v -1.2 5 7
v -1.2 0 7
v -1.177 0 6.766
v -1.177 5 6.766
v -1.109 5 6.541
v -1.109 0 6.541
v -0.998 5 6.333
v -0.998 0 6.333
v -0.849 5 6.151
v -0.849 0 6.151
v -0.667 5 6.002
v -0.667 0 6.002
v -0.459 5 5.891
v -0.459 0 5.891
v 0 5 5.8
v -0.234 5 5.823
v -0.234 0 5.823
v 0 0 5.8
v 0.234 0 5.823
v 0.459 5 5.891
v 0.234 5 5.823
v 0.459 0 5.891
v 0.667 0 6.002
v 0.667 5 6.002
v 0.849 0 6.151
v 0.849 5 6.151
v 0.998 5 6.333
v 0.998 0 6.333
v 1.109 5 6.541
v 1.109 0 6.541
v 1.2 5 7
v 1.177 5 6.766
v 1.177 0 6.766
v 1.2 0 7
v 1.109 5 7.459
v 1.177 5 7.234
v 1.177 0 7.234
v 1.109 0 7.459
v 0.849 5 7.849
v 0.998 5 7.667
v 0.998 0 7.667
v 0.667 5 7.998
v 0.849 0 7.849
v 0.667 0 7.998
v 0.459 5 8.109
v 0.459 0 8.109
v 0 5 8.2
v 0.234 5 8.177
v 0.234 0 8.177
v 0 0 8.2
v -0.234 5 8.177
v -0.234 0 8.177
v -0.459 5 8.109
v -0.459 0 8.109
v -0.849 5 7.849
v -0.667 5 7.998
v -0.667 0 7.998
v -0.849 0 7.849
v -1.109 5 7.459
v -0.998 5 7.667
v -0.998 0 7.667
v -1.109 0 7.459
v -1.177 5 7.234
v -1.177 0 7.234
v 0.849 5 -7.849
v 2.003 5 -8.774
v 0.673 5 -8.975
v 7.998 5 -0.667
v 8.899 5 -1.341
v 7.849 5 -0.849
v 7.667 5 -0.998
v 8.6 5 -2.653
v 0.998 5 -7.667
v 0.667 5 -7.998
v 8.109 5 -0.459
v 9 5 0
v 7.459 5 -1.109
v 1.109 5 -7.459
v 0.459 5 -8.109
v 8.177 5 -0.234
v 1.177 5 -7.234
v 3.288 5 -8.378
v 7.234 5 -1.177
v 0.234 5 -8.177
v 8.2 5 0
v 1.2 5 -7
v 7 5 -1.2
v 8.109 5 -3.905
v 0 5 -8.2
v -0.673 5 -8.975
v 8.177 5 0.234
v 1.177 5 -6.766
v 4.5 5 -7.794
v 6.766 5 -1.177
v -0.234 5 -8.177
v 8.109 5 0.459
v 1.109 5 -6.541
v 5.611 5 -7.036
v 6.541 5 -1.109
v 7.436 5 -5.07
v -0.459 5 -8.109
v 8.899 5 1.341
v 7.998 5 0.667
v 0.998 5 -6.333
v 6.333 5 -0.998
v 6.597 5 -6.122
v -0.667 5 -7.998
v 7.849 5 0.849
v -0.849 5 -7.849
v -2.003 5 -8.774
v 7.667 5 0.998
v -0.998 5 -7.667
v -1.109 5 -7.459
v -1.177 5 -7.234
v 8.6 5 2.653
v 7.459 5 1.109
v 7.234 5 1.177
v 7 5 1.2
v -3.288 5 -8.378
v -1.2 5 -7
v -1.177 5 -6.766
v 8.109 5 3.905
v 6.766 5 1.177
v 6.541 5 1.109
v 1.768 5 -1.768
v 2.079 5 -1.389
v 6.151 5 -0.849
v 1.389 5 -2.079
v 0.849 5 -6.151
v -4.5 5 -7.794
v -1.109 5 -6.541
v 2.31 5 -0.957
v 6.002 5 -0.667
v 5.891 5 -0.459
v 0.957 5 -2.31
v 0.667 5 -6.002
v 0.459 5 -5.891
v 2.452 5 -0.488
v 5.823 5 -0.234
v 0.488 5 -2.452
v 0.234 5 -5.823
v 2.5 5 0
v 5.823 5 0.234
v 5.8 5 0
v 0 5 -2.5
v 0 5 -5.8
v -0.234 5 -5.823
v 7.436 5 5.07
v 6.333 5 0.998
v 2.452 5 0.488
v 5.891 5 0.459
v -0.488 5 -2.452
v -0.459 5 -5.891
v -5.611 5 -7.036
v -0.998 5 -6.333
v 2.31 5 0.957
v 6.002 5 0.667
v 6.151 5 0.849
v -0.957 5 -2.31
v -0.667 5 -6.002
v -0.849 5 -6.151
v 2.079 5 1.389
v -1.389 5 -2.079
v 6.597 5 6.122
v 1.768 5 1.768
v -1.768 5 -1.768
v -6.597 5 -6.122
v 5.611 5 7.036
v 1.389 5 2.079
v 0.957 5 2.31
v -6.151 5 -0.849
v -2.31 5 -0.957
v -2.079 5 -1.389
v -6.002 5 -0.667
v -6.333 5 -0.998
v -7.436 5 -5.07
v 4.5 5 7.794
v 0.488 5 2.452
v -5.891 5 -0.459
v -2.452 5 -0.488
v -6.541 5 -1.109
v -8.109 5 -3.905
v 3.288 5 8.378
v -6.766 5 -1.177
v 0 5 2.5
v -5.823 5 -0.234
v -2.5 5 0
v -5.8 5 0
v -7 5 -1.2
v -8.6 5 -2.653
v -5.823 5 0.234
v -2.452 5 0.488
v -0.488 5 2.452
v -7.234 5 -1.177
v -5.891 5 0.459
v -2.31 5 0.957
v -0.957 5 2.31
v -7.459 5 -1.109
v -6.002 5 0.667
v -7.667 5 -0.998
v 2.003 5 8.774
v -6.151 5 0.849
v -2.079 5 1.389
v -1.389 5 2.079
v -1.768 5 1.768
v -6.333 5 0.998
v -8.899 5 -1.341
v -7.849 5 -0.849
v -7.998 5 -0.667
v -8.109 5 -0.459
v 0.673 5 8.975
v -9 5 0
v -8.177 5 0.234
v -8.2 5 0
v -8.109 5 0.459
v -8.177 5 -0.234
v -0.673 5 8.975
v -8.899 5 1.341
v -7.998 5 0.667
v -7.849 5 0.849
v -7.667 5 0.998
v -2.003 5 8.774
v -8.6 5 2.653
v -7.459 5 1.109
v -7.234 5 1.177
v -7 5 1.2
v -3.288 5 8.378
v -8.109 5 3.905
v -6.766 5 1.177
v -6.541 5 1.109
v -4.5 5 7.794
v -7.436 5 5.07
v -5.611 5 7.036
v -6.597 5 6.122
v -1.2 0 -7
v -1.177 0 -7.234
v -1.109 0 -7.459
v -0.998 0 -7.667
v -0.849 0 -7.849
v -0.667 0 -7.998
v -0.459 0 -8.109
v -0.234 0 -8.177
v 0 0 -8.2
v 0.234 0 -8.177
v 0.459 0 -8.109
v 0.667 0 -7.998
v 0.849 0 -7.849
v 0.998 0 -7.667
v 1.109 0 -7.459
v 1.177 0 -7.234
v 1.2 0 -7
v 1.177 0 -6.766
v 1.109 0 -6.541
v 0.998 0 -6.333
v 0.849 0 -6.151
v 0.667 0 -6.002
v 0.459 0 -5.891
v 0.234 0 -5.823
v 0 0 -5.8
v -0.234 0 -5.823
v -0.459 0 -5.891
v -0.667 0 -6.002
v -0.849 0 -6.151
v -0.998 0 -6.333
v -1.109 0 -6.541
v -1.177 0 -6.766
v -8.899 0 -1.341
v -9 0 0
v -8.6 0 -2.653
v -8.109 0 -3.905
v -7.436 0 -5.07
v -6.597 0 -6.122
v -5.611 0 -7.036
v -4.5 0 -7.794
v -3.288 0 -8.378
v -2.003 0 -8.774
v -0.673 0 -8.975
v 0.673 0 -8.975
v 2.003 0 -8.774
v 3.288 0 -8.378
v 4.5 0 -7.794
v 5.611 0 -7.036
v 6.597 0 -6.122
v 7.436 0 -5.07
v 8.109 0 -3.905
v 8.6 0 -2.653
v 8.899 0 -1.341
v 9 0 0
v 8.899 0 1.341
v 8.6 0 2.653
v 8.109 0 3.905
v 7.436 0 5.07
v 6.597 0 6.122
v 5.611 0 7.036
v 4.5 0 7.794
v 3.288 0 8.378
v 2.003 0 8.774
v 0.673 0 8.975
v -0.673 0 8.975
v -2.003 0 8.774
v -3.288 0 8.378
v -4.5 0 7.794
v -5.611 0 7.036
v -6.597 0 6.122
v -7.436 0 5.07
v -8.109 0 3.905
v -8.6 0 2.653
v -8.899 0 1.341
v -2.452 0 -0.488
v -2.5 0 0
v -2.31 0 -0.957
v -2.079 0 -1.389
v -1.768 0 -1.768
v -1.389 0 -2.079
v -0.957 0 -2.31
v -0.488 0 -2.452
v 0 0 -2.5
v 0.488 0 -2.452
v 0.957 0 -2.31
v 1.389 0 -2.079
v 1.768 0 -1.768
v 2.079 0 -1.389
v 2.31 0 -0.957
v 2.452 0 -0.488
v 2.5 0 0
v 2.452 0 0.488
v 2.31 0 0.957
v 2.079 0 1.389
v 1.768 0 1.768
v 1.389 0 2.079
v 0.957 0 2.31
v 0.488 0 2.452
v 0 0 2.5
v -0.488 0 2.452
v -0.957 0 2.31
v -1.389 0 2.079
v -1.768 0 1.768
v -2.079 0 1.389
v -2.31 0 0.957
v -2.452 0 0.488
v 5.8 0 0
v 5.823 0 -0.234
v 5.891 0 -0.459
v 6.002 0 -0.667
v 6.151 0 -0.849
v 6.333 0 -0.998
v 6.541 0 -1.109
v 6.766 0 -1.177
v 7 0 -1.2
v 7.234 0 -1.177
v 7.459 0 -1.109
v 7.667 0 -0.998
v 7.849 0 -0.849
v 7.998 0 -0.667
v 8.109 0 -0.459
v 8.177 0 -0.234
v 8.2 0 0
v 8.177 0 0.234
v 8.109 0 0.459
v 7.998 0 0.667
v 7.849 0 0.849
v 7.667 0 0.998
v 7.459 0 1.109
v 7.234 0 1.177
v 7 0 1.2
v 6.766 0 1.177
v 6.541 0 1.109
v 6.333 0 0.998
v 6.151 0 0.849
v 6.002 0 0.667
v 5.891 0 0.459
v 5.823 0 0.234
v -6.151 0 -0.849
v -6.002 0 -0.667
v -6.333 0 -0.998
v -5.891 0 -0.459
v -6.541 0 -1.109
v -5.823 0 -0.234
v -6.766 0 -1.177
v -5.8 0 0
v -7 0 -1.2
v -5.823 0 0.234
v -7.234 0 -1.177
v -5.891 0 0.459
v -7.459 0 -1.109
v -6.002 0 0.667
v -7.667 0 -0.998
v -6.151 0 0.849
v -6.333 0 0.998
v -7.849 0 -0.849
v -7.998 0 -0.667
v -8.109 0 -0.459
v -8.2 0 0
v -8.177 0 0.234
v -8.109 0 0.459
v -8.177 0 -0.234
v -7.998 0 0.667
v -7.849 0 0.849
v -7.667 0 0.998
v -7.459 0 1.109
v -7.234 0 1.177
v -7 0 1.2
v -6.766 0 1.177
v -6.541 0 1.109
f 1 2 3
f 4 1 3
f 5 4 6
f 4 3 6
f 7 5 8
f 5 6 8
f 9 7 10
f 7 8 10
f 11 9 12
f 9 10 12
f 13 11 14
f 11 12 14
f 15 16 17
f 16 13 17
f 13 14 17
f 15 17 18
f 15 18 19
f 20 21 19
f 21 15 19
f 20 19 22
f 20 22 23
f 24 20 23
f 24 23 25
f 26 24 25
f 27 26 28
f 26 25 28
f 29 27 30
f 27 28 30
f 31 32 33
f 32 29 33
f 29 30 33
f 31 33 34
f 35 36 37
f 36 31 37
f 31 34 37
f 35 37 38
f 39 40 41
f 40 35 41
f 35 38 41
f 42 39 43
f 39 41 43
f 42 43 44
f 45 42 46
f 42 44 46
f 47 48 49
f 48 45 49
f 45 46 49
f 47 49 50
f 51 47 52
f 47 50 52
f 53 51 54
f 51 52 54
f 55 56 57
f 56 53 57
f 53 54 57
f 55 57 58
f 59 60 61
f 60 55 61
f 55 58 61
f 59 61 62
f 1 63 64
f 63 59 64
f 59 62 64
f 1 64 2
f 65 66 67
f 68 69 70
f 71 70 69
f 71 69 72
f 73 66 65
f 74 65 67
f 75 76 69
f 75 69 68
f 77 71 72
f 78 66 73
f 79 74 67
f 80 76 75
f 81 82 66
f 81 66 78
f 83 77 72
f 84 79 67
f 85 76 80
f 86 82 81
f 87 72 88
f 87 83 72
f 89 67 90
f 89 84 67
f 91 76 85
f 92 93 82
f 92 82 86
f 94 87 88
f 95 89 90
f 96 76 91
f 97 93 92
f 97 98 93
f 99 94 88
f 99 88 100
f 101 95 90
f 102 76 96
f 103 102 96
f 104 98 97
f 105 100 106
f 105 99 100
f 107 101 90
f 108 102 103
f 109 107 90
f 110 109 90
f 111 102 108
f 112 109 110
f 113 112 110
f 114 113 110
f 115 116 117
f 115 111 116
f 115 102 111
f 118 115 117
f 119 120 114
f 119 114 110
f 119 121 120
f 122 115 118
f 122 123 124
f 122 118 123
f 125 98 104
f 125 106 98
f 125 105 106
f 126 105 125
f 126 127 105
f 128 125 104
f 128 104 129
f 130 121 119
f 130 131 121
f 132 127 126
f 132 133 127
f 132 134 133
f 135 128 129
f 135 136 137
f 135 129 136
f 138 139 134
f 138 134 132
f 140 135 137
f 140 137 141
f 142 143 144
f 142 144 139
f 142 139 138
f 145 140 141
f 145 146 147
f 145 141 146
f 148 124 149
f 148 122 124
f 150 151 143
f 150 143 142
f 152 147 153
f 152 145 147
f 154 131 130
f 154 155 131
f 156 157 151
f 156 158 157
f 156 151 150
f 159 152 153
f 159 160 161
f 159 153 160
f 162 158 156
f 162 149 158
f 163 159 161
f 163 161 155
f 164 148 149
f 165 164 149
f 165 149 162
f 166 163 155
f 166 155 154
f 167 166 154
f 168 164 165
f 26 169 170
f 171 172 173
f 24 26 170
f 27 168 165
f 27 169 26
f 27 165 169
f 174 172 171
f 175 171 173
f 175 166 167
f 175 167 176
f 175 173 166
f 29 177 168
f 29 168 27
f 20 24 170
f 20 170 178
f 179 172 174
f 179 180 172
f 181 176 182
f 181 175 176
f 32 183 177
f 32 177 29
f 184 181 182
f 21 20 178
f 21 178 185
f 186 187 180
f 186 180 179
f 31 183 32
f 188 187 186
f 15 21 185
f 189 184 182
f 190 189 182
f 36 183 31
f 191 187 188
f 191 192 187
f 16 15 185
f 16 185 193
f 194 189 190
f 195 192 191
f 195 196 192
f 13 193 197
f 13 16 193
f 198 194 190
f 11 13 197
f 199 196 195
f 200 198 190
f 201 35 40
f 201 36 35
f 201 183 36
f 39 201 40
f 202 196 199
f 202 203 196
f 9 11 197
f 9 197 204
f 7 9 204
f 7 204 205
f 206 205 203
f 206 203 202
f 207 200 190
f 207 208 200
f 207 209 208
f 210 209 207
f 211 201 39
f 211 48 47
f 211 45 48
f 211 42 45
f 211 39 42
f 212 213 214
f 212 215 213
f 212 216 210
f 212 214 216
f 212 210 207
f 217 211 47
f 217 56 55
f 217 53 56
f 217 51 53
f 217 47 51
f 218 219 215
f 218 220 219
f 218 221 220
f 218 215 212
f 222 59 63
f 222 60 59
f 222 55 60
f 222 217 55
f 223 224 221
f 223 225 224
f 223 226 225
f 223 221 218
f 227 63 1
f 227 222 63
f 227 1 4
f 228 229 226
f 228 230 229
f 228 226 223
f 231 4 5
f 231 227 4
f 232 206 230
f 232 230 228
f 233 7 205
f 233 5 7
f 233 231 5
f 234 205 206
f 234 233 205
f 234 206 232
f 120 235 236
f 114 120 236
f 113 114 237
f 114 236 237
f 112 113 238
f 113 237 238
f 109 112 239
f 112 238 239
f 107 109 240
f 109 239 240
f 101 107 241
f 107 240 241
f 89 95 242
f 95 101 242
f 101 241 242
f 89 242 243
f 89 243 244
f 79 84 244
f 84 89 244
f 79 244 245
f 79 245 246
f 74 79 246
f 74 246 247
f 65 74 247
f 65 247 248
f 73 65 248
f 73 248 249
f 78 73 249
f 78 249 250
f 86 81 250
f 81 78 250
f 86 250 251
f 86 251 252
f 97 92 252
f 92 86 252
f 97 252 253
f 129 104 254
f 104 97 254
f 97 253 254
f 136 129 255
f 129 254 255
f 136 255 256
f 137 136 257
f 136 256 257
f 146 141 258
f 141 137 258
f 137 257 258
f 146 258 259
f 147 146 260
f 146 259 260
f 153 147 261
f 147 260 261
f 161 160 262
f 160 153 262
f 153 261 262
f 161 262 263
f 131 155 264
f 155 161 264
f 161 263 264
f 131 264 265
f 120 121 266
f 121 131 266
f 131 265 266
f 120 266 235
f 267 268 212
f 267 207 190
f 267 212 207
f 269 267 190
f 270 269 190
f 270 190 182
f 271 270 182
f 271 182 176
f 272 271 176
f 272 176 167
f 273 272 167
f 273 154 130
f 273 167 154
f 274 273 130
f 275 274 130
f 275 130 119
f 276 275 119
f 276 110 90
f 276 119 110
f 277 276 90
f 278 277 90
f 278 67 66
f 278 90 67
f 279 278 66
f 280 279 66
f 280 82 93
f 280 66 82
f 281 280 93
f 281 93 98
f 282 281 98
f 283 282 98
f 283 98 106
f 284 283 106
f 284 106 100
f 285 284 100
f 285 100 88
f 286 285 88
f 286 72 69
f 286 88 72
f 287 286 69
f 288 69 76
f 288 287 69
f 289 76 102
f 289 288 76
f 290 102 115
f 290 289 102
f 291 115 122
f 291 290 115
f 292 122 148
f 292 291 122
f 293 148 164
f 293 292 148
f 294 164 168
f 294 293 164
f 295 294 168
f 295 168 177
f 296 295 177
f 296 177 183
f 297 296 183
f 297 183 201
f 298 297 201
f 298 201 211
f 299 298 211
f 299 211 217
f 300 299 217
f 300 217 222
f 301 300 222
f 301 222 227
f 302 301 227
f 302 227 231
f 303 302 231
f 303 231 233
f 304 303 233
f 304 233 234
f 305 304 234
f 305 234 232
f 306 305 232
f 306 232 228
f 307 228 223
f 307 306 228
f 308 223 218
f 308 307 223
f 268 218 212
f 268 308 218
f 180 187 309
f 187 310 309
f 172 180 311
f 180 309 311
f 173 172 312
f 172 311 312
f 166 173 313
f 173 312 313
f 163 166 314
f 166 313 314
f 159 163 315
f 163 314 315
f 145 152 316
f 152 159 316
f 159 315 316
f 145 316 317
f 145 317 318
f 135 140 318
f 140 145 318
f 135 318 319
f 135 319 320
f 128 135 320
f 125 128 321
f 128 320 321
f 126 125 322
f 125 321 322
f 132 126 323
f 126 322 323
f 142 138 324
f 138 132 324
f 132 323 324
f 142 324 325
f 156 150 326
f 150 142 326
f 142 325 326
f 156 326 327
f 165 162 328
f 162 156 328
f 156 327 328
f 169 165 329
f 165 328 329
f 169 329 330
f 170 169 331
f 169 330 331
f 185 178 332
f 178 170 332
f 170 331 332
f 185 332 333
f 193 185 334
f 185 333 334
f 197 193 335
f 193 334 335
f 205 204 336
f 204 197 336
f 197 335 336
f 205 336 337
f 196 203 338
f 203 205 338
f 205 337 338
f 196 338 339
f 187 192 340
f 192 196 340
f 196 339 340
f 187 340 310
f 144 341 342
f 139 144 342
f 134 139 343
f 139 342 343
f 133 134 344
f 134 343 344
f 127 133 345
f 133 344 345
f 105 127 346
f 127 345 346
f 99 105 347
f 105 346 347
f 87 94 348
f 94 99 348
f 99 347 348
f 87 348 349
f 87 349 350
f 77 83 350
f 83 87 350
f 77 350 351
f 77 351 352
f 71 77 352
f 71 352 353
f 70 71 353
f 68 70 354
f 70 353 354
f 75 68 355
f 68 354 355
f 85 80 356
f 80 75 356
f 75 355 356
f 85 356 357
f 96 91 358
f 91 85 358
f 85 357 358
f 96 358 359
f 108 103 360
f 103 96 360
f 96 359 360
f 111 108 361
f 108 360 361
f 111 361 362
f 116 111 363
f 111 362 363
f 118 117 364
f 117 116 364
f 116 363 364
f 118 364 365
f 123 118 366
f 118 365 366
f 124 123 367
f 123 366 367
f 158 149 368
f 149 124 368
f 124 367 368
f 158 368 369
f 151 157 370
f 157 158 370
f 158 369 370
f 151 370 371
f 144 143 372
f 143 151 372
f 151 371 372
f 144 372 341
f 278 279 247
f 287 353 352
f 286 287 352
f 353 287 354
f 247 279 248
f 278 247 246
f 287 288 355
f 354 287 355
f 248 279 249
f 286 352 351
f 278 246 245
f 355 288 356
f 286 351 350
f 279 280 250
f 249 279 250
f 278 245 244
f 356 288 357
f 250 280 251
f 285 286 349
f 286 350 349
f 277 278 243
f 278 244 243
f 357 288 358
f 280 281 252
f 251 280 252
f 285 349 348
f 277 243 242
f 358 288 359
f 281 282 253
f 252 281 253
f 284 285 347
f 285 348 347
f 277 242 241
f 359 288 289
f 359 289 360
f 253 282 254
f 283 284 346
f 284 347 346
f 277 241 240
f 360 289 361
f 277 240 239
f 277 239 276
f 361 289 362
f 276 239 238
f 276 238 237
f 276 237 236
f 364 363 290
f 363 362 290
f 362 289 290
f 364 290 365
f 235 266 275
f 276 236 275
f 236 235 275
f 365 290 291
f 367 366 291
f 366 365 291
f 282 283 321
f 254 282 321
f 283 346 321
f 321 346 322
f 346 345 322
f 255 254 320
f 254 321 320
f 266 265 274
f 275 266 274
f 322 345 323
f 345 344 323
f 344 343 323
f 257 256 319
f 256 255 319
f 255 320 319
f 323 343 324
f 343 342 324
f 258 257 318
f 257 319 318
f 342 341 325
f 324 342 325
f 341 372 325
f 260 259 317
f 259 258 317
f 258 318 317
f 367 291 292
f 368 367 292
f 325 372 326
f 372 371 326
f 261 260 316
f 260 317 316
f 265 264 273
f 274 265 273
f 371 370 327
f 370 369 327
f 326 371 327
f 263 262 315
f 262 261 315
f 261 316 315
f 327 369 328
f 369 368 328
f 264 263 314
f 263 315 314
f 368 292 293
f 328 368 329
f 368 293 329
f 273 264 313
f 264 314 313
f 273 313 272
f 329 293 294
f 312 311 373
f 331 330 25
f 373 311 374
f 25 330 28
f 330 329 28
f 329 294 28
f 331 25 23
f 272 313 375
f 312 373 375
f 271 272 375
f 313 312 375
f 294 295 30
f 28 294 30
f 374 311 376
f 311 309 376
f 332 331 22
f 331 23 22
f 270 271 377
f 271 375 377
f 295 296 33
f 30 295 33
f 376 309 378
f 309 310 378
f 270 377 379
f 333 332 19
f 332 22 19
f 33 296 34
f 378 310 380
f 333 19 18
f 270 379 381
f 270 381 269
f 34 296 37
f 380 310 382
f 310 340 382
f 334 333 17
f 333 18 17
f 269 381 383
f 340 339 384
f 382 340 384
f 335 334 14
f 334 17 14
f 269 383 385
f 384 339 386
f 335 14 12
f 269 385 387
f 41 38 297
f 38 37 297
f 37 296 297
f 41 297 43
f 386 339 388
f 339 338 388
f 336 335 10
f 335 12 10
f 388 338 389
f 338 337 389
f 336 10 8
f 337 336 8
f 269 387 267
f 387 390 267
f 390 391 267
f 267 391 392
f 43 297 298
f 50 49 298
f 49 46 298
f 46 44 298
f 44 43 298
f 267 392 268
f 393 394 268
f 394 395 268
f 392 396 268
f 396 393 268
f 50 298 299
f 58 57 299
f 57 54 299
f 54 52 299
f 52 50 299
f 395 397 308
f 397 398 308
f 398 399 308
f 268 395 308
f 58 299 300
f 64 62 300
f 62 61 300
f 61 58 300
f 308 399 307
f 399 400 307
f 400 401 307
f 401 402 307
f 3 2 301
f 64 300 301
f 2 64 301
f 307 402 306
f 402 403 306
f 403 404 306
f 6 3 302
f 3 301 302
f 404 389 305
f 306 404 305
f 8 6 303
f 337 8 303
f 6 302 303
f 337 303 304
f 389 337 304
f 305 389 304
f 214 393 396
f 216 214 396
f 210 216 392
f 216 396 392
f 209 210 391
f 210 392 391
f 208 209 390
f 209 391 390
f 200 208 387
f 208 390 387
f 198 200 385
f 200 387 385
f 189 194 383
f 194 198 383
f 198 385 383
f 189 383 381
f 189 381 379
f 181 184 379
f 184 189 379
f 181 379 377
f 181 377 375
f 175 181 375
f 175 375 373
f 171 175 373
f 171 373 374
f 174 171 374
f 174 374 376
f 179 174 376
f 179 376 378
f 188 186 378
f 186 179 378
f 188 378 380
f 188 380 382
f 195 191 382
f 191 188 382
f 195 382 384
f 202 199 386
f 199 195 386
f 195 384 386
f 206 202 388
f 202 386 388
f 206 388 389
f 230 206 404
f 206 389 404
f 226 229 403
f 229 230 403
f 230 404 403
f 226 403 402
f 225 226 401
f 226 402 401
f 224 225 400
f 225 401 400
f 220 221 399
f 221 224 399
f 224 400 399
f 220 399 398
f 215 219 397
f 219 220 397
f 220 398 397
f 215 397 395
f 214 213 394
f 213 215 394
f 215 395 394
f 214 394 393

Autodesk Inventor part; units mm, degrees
ref_plane "YZ Plane" through (0, 0, 0) normal (1, 0, 0) x (0, 1, 0)
ref_plane "XZ Plane" through (0, 0, 0) normal (0, 1, 0) x (-1, 0, 0)
ref_plane "XY Plane" through (0, 0, 0) normal (0, 0, 1) x (1, 0, 0)
sketch "Sketch1" plane through (0, 0, 0) normal (0, 1, 0) x (-1, 0, 0)
  circle A0 centre (0, 0) radius 9
  circle A1 centre (0, 0) radius 2.5
  circle A2 centre (7, 0) radius 1.2
  circle A3 centre (0, 7) radius 1.2
  circle A4 centre (-7, 0) radius 1.2
  circle A5 centre (0, -7) radius 1.2
  dimension "d0" = 18
  dimension "d1" = 5
  dimension "d2" = 2.4
  dimension "d3" = 7
  dimension "d6" = 360
extrude "Extrusion1" add sketch "Sketch1" along normal blind 5
properties part number "Motor_adaptor"
